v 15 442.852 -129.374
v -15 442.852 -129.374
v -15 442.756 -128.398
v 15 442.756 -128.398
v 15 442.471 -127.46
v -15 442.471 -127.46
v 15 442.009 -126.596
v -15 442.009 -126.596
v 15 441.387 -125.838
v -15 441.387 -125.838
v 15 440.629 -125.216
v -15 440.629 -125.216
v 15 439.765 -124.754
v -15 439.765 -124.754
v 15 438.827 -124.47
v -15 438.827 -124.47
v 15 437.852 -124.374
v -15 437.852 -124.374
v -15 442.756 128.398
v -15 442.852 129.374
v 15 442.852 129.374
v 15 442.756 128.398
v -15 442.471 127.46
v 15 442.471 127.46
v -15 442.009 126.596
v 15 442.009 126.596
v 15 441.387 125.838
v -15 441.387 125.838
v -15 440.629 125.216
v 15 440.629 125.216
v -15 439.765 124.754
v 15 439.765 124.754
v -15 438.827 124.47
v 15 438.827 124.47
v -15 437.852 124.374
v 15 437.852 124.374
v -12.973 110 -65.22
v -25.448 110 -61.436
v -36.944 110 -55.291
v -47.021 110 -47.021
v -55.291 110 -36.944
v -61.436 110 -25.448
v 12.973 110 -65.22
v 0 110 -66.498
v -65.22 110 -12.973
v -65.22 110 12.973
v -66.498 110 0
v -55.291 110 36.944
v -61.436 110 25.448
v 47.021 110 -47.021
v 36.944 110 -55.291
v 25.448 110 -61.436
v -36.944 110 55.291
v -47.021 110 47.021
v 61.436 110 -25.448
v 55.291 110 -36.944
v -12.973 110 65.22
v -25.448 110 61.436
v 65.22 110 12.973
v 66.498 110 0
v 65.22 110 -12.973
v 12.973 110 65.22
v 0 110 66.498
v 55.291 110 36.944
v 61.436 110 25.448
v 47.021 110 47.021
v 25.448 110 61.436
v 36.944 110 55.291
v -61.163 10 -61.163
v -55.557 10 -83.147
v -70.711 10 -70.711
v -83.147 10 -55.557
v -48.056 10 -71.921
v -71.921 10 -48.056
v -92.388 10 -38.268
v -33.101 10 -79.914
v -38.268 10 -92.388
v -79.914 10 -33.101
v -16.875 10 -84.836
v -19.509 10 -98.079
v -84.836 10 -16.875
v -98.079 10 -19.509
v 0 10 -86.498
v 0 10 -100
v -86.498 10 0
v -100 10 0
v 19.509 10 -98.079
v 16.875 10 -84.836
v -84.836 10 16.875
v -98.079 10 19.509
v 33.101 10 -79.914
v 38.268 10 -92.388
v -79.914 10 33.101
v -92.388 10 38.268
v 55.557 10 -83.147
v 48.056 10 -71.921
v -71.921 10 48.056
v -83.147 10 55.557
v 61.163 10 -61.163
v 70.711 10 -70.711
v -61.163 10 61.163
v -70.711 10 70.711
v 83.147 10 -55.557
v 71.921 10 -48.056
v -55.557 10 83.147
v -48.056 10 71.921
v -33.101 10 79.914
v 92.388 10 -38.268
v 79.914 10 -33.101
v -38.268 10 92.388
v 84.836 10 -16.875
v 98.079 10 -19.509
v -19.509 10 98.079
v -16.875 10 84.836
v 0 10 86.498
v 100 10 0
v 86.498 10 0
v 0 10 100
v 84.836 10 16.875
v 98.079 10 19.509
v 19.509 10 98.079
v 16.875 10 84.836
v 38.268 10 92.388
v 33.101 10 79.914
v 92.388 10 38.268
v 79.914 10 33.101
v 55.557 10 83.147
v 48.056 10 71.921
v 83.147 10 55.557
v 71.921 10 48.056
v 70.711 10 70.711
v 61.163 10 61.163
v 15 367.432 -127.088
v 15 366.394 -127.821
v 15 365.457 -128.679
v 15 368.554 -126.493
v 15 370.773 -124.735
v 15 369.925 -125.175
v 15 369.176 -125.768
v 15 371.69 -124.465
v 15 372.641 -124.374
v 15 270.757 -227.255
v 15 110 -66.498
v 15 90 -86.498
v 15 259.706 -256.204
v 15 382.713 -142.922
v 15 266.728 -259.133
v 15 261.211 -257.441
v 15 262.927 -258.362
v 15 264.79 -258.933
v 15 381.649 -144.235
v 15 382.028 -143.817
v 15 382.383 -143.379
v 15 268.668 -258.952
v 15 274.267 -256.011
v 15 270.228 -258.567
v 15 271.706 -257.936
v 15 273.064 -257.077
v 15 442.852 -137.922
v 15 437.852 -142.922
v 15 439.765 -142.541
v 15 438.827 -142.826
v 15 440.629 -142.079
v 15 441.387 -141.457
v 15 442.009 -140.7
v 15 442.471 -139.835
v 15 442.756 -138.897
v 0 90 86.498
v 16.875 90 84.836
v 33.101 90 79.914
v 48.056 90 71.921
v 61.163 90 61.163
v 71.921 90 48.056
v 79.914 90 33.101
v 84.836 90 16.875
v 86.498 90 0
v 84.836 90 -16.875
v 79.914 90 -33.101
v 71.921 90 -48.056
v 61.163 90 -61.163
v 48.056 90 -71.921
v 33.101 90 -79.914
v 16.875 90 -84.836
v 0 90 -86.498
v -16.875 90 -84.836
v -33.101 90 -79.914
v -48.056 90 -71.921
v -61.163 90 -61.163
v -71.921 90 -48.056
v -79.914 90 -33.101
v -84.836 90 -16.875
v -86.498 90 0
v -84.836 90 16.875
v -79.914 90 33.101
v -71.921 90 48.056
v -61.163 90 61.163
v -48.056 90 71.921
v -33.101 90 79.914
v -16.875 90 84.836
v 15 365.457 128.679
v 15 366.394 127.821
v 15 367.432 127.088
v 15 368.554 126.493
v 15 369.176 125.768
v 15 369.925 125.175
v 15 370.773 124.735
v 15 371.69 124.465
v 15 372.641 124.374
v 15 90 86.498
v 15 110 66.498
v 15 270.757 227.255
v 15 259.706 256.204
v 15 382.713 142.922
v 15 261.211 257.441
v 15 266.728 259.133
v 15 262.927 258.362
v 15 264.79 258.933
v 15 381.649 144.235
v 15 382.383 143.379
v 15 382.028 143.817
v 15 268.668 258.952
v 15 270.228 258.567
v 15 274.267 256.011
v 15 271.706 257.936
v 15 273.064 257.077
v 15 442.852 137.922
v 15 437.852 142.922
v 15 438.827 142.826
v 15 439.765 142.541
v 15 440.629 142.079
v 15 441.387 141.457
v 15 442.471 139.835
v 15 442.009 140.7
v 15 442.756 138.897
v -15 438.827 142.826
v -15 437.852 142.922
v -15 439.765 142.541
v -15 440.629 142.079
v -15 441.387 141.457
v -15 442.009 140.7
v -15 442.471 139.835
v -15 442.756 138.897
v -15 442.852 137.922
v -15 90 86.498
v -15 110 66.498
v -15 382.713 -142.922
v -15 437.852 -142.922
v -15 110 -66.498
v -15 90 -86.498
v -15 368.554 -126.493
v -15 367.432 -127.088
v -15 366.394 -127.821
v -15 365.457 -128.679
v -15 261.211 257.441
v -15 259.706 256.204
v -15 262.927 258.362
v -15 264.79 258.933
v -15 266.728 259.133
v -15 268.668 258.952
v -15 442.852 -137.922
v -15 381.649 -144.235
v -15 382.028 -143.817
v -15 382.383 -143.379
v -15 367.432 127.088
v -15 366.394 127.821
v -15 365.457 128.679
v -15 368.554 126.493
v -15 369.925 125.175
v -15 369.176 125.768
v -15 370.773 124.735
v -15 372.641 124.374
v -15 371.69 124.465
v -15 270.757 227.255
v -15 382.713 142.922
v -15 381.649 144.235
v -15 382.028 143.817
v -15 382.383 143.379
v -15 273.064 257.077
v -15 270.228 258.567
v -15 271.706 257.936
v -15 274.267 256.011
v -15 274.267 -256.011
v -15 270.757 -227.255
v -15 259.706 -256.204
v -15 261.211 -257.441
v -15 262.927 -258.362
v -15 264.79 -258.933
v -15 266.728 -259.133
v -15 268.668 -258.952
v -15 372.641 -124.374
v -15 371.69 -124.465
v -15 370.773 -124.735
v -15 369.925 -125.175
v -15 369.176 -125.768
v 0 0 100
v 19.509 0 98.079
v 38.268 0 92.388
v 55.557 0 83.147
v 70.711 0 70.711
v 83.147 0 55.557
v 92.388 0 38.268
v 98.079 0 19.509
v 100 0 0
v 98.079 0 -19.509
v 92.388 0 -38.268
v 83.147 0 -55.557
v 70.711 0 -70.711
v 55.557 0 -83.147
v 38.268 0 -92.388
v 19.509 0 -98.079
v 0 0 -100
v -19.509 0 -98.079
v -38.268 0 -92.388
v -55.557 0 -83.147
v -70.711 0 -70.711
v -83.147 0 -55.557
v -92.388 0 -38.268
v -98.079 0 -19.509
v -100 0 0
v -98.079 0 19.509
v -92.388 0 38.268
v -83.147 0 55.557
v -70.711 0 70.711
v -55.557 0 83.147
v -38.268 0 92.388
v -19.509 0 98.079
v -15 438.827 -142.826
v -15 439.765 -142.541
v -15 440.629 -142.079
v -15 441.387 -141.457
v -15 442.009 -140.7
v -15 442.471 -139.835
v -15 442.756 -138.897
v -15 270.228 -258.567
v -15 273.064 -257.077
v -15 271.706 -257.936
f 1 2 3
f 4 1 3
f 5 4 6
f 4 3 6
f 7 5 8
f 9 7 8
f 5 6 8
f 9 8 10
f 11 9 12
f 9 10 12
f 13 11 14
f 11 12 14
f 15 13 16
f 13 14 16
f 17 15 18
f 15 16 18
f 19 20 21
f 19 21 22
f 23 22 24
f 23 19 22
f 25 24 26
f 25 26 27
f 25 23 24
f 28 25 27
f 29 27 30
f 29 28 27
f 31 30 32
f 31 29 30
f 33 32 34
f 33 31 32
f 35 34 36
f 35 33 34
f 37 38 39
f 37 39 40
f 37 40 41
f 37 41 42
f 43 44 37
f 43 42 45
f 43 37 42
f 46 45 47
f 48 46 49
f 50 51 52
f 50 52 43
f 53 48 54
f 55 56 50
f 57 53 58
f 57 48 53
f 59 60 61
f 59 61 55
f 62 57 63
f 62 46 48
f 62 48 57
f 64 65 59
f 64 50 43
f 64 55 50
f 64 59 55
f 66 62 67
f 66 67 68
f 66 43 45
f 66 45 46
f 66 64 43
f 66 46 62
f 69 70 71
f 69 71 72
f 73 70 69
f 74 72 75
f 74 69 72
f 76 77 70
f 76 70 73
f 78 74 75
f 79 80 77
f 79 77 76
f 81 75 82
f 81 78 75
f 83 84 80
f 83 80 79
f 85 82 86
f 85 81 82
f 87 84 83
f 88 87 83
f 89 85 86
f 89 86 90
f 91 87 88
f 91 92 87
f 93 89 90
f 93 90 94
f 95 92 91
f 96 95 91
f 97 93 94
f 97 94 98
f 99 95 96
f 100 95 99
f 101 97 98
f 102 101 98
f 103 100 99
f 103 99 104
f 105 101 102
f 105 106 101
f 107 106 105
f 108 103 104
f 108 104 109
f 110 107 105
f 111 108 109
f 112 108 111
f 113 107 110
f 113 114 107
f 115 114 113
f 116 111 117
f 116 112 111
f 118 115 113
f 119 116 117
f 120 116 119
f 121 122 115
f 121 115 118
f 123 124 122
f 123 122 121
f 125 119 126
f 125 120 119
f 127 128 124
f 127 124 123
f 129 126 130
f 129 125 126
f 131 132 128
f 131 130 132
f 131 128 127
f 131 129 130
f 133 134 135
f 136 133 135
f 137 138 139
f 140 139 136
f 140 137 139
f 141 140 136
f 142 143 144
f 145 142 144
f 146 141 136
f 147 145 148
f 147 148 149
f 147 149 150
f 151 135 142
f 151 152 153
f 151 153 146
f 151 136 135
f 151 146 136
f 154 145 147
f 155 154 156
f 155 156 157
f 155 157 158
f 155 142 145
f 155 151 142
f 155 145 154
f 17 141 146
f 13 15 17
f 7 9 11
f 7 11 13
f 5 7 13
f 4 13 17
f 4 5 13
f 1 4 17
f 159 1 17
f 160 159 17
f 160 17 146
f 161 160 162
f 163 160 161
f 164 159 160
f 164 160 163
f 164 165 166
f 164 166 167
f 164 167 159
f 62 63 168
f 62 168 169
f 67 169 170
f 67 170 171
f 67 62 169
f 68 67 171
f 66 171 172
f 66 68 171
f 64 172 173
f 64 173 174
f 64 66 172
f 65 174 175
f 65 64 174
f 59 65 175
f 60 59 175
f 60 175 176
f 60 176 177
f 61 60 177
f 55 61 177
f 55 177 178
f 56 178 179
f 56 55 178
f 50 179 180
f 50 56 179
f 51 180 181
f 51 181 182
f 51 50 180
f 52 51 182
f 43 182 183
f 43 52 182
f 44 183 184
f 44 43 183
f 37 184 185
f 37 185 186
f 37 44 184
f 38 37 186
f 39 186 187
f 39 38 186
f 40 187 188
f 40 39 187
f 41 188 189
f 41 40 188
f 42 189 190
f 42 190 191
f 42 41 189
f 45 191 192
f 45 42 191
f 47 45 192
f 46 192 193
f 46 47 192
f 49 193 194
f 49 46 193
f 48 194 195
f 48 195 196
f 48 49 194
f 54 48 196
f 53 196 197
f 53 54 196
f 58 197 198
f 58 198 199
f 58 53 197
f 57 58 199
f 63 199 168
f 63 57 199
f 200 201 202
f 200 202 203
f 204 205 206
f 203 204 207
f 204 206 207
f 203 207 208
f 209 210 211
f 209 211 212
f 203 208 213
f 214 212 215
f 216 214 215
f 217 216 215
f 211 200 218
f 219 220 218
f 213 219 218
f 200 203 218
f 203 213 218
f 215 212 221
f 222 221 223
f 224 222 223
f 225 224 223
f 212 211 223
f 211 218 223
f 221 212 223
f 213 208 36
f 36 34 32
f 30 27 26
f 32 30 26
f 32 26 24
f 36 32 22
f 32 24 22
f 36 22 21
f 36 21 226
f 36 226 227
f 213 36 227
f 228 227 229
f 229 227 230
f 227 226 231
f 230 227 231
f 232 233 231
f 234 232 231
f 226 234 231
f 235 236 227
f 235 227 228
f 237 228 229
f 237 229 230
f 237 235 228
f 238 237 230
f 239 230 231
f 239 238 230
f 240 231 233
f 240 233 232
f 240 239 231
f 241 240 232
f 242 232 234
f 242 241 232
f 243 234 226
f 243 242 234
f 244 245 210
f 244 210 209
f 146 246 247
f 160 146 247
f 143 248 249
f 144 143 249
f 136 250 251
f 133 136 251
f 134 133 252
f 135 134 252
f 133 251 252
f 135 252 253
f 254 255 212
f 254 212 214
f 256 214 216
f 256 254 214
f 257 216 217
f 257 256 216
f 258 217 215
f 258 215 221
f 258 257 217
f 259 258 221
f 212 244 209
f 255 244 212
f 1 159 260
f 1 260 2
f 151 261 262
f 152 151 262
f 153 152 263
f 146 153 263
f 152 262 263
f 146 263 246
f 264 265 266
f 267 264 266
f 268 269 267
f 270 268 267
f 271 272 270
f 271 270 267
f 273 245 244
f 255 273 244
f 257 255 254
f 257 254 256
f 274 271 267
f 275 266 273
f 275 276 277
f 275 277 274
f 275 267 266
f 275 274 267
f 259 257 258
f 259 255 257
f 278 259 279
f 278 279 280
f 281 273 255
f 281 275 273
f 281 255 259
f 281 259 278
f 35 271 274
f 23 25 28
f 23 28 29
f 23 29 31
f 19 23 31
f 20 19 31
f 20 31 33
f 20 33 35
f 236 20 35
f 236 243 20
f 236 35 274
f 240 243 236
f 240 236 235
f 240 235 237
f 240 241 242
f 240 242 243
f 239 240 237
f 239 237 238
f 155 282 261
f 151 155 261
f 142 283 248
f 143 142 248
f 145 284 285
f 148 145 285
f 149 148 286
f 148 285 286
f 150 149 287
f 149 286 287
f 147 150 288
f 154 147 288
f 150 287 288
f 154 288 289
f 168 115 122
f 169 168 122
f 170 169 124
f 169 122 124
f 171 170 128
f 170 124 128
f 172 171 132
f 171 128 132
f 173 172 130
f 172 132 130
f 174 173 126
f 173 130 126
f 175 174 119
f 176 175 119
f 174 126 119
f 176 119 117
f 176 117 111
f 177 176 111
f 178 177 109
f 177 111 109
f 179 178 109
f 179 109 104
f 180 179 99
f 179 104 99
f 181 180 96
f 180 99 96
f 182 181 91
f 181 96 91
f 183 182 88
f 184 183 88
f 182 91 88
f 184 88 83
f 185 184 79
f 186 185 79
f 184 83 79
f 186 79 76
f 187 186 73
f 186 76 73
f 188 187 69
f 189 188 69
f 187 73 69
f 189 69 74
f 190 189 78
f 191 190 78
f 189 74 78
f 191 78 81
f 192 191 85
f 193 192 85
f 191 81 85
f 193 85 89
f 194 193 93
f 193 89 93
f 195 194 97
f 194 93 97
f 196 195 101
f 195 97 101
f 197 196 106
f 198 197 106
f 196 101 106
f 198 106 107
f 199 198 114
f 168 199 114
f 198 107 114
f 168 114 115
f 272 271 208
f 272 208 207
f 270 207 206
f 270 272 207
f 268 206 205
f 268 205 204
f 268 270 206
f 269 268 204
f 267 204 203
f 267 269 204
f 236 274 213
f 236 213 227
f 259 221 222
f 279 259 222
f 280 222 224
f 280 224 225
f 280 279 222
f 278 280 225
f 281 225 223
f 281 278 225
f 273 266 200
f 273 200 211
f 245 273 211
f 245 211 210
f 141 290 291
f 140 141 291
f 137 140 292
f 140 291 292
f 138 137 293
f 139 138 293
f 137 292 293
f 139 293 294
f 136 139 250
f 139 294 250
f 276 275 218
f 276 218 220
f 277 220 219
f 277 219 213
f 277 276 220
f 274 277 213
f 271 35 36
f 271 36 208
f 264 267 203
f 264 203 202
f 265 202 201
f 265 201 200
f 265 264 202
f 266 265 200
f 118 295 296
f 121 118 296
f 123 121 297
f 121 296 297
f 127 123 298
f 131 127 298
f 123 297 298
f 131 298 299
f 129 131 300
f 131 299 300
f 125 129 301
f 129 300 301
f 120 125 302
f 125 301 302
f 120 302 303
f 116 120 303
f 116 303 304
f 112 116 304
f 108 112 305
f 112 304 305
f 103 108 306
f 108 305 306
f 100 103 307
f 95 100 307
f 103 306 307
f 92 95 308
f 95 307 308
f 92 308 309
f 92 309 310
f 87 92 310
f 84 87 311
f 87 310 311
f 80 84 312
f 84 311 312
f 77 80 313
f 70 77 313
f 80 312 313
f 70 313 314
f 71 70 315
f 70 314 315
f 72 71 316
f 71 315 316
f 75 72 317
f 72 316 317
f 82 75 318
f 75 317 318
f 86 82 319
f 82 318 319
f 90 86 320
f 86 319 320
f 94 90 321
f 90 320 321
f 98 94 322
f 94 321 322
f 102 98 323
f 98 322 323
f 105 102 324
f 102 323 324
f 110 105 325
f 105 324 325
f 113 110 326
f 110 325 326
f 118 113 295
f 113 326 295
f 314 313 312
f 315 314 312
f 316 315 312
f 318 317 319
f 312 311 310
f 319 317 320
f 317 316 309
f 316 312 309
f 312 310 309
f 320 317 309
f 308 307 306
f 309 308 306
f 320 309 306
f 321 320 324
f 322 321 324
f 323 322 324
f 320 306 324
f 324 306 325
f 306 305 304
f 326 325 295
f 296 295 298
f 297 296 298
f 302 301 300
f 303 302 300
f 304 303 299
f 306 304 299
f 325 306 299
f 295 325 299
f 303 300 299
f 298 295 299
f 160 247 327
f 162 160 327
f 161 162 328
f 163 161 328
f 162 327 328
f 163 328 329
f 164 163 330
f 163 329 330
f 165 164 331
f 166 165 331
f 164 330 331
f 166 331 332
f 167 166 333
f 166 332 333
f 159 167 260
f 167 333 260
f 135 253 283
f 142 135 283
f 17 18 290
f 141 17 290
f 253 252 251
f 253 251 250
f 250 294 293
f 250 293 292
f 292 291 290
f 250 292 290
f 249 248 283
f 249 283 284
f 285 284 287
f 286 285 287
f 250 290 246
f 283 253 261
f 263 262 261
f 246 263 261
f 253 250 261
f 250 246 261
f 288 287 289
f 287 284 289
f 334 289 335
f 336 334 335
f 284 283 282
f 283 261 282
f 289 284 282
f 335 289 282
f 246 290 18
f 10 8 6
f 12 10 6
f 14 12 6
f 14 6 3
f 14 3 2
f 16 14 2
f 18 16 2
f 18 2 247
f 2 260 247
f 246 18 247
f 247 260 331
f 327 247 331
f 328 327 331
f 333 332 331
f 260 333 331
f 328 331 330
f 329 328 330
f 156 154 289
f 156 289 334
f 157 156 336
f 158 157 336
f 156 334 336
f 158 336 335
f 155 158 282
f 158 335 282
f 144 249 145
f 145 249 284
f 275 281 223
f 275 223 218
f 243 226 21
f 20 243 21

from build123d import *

# Parameters (mm, degrees)
SKETCH2_R                = 100
BOSS_EXTRUDE1_DEPTH      = 10
SKETCH3_R                = 86.498143994
BOSS_EXTRUDE2_DEPTH      = 100
CHAMFER1_SIZE            = 20
BOSS_EXTRUDE3_DEPTH      = 15
BOSS_EXTRUDE3_DEPTH_BACK = 15
BOSS_EXTRUDE4_DEPTH      = 15
BOSS_EXTRUDE4_DEPTH_BACK = 15
BOSS_EXTRUDE5_DEPTH      = 15
BOSS_EXTRUDE5_DEPTH_BACK = 15


with BuildPart() as part:
    # Sketch2 → Boss-Extrude1 (new body)
    with BuildSketch(Plane(origin=(0, 0, 0), x_dir=(1, 0, 0), z_dir=(0, 1, 0))):
        Circle(SKETCH2_R)
    extrude(amount=BOSS_EXTRUDE1_DEPTH)

    # Sketch3 → Boss-Extrude2 (add)
    with BuildSketch(Plane(origin=(0, 10, 0), x_dir=(1, 0, 0), z_dir=(0, 1, 0))):
        Circle(SKETCH3_R)
    extrude(amount=BOSS_EXTRUDE2_DEPTH)

    # Chamfer1
    chamfer1_edges = [part.edges().sort_by_distance(p)[0] for p in [
        (-86.498143994, 110, 0),
    ]]
    chamfer(chamfer1_edges, length=CHAMFER1_SIZE)


with BuildPart() as body_2:
    # Sketch4 → Boss-Extrude3 (new, two sides: drawn at the far end of the back side and taken through both)
    with BuildSketch(Plane(origin=(0, 0, 0), x_dir=(0, 0, -1), z_dir=(1, 0, 0)).offset(-BOSS_EXTRUDE3_DEPTH_BACK)):
        with BuildLine():
            Line((-66.498143994, 110), (-86.498143994, 90))
            Line((-86.498143994, 90), (-256.203771479, 259.705627485))
            ThreePointArc((-256.203771479, 259.705627485), (-259.132703667, 266.776695297), (-256.203771479, 273.847763109))
            Line((-256.203771479, 273.847763109), (-250.345907103, 279.705627485))
            ThreePointArc((-250.345907103, 279.705627485), (-243.274839291, 282.634559673), (-236.203771479, 279.705627485))
            Line((-236.203771479, 279.705627485), (-66.498143994, 110))
        make_face()
    extrude(amount=BOSS_EXTRUDE3_DEPTH + BOSS_EXTRUDE3_DEPTH_BACK)

    # Sketch5 → Boss-Extrude4 (add, two sides: drawn at the far end of the back side and taken through both)
    with BuildSketch(Plane(origin=(0, 0, 0), x_dir=(0, 0, -1), z_dir=(1, 0, 0)).offset(-BOSS_EXTRUDE4_DEPTH_BACK)):
        with BuildLine():
            Line((-254.594745219, 258.358125178), (-256.294499809, 260.127425653))
            ThreePointArc((-256.294499809, 260.127425653), (-259.081114839, 267.25577893), (-256.011042283, 274.266720255))
            Line((-256.011042283, 274.266720255), (-144.234713298, 381.649457594))
            ThreePointArc((-144.234713298, 381.649457594), (-137.106360022, 384.436072625), (-130.095418696, 381.366000069))
            Line((-130.095418696, 381.366000069), (-128.395664107, 379.596699593))
            ThreePointArc((-128.395664107, 379.596699593), (-125.609049076, 372.468346317), (-128.679121632, 365.457404992))
            Line((-128.679121632, 365.457404992), (-240.455450617, 258.074667652))
            ThreePointArc((-240.455450617, 258.074667652), (-247.583803894, 255.288052622), (-254.594745219, 258.358125178))
        make_face()
    extrude(amount=BOSS_EXTRUDE4_DEPTH + BOSS_EXTRUDE4_DEPTH_BACK)

    # Sketch7 → Boss-Extrude5 (add, two sides: drawn at the far end of the back side and taken through both)
    with BuildSketch(Plane(origin=(0, 0, 0), x_dir=(0, 0, -1), z_dir=(1, 0, 0)).offset(-BOSS_EXTRUDE5_DEPTH_BACK)):
        with BuildLine():
            Line((-129.373692, 367.640594563), (-137.921663821, 367.640594563))
            ThreePointArc((-137.921663821, 367.640594563), (-141.457197727, 369.105060657), (-142.921663821, 372.640594563))
            Line((-142.921663821, 372.640594563), (-142.921663821, 437.851601178))
            ThreePointArc((-142.921663821, 437.851601178), (-141.457197727, 441.387135084), (-137.921663821, 442.851601178))
            Line((-137.921663821, 442.851601178), (-129.373692, 442.851601178))
            ThreePointArc((-129.373692, 442.851601178), (-125.838158094, 441.387135084), (-124.373692, 437.851601178))
            Line((-124.373692, 437.851601178), (-124.373692, 372.640594563))
            ThreePointArc((-124.373692, 372.640594563), (-125.838158094, 369.105060657), (-129.373692, 367.640594563))
        make_face()
    extrude(amount=BOSS_EXTRUDE5_DEPTH + BOSS_EXTRUDE5_DEPTH_BACK)


with BuildPart() as body_3:
    # Mirror6: mirrored copy
    add(body_2.part.mirror(Plane.XY))


solid = Compound([part.part, body_2.part, body_3.part])
